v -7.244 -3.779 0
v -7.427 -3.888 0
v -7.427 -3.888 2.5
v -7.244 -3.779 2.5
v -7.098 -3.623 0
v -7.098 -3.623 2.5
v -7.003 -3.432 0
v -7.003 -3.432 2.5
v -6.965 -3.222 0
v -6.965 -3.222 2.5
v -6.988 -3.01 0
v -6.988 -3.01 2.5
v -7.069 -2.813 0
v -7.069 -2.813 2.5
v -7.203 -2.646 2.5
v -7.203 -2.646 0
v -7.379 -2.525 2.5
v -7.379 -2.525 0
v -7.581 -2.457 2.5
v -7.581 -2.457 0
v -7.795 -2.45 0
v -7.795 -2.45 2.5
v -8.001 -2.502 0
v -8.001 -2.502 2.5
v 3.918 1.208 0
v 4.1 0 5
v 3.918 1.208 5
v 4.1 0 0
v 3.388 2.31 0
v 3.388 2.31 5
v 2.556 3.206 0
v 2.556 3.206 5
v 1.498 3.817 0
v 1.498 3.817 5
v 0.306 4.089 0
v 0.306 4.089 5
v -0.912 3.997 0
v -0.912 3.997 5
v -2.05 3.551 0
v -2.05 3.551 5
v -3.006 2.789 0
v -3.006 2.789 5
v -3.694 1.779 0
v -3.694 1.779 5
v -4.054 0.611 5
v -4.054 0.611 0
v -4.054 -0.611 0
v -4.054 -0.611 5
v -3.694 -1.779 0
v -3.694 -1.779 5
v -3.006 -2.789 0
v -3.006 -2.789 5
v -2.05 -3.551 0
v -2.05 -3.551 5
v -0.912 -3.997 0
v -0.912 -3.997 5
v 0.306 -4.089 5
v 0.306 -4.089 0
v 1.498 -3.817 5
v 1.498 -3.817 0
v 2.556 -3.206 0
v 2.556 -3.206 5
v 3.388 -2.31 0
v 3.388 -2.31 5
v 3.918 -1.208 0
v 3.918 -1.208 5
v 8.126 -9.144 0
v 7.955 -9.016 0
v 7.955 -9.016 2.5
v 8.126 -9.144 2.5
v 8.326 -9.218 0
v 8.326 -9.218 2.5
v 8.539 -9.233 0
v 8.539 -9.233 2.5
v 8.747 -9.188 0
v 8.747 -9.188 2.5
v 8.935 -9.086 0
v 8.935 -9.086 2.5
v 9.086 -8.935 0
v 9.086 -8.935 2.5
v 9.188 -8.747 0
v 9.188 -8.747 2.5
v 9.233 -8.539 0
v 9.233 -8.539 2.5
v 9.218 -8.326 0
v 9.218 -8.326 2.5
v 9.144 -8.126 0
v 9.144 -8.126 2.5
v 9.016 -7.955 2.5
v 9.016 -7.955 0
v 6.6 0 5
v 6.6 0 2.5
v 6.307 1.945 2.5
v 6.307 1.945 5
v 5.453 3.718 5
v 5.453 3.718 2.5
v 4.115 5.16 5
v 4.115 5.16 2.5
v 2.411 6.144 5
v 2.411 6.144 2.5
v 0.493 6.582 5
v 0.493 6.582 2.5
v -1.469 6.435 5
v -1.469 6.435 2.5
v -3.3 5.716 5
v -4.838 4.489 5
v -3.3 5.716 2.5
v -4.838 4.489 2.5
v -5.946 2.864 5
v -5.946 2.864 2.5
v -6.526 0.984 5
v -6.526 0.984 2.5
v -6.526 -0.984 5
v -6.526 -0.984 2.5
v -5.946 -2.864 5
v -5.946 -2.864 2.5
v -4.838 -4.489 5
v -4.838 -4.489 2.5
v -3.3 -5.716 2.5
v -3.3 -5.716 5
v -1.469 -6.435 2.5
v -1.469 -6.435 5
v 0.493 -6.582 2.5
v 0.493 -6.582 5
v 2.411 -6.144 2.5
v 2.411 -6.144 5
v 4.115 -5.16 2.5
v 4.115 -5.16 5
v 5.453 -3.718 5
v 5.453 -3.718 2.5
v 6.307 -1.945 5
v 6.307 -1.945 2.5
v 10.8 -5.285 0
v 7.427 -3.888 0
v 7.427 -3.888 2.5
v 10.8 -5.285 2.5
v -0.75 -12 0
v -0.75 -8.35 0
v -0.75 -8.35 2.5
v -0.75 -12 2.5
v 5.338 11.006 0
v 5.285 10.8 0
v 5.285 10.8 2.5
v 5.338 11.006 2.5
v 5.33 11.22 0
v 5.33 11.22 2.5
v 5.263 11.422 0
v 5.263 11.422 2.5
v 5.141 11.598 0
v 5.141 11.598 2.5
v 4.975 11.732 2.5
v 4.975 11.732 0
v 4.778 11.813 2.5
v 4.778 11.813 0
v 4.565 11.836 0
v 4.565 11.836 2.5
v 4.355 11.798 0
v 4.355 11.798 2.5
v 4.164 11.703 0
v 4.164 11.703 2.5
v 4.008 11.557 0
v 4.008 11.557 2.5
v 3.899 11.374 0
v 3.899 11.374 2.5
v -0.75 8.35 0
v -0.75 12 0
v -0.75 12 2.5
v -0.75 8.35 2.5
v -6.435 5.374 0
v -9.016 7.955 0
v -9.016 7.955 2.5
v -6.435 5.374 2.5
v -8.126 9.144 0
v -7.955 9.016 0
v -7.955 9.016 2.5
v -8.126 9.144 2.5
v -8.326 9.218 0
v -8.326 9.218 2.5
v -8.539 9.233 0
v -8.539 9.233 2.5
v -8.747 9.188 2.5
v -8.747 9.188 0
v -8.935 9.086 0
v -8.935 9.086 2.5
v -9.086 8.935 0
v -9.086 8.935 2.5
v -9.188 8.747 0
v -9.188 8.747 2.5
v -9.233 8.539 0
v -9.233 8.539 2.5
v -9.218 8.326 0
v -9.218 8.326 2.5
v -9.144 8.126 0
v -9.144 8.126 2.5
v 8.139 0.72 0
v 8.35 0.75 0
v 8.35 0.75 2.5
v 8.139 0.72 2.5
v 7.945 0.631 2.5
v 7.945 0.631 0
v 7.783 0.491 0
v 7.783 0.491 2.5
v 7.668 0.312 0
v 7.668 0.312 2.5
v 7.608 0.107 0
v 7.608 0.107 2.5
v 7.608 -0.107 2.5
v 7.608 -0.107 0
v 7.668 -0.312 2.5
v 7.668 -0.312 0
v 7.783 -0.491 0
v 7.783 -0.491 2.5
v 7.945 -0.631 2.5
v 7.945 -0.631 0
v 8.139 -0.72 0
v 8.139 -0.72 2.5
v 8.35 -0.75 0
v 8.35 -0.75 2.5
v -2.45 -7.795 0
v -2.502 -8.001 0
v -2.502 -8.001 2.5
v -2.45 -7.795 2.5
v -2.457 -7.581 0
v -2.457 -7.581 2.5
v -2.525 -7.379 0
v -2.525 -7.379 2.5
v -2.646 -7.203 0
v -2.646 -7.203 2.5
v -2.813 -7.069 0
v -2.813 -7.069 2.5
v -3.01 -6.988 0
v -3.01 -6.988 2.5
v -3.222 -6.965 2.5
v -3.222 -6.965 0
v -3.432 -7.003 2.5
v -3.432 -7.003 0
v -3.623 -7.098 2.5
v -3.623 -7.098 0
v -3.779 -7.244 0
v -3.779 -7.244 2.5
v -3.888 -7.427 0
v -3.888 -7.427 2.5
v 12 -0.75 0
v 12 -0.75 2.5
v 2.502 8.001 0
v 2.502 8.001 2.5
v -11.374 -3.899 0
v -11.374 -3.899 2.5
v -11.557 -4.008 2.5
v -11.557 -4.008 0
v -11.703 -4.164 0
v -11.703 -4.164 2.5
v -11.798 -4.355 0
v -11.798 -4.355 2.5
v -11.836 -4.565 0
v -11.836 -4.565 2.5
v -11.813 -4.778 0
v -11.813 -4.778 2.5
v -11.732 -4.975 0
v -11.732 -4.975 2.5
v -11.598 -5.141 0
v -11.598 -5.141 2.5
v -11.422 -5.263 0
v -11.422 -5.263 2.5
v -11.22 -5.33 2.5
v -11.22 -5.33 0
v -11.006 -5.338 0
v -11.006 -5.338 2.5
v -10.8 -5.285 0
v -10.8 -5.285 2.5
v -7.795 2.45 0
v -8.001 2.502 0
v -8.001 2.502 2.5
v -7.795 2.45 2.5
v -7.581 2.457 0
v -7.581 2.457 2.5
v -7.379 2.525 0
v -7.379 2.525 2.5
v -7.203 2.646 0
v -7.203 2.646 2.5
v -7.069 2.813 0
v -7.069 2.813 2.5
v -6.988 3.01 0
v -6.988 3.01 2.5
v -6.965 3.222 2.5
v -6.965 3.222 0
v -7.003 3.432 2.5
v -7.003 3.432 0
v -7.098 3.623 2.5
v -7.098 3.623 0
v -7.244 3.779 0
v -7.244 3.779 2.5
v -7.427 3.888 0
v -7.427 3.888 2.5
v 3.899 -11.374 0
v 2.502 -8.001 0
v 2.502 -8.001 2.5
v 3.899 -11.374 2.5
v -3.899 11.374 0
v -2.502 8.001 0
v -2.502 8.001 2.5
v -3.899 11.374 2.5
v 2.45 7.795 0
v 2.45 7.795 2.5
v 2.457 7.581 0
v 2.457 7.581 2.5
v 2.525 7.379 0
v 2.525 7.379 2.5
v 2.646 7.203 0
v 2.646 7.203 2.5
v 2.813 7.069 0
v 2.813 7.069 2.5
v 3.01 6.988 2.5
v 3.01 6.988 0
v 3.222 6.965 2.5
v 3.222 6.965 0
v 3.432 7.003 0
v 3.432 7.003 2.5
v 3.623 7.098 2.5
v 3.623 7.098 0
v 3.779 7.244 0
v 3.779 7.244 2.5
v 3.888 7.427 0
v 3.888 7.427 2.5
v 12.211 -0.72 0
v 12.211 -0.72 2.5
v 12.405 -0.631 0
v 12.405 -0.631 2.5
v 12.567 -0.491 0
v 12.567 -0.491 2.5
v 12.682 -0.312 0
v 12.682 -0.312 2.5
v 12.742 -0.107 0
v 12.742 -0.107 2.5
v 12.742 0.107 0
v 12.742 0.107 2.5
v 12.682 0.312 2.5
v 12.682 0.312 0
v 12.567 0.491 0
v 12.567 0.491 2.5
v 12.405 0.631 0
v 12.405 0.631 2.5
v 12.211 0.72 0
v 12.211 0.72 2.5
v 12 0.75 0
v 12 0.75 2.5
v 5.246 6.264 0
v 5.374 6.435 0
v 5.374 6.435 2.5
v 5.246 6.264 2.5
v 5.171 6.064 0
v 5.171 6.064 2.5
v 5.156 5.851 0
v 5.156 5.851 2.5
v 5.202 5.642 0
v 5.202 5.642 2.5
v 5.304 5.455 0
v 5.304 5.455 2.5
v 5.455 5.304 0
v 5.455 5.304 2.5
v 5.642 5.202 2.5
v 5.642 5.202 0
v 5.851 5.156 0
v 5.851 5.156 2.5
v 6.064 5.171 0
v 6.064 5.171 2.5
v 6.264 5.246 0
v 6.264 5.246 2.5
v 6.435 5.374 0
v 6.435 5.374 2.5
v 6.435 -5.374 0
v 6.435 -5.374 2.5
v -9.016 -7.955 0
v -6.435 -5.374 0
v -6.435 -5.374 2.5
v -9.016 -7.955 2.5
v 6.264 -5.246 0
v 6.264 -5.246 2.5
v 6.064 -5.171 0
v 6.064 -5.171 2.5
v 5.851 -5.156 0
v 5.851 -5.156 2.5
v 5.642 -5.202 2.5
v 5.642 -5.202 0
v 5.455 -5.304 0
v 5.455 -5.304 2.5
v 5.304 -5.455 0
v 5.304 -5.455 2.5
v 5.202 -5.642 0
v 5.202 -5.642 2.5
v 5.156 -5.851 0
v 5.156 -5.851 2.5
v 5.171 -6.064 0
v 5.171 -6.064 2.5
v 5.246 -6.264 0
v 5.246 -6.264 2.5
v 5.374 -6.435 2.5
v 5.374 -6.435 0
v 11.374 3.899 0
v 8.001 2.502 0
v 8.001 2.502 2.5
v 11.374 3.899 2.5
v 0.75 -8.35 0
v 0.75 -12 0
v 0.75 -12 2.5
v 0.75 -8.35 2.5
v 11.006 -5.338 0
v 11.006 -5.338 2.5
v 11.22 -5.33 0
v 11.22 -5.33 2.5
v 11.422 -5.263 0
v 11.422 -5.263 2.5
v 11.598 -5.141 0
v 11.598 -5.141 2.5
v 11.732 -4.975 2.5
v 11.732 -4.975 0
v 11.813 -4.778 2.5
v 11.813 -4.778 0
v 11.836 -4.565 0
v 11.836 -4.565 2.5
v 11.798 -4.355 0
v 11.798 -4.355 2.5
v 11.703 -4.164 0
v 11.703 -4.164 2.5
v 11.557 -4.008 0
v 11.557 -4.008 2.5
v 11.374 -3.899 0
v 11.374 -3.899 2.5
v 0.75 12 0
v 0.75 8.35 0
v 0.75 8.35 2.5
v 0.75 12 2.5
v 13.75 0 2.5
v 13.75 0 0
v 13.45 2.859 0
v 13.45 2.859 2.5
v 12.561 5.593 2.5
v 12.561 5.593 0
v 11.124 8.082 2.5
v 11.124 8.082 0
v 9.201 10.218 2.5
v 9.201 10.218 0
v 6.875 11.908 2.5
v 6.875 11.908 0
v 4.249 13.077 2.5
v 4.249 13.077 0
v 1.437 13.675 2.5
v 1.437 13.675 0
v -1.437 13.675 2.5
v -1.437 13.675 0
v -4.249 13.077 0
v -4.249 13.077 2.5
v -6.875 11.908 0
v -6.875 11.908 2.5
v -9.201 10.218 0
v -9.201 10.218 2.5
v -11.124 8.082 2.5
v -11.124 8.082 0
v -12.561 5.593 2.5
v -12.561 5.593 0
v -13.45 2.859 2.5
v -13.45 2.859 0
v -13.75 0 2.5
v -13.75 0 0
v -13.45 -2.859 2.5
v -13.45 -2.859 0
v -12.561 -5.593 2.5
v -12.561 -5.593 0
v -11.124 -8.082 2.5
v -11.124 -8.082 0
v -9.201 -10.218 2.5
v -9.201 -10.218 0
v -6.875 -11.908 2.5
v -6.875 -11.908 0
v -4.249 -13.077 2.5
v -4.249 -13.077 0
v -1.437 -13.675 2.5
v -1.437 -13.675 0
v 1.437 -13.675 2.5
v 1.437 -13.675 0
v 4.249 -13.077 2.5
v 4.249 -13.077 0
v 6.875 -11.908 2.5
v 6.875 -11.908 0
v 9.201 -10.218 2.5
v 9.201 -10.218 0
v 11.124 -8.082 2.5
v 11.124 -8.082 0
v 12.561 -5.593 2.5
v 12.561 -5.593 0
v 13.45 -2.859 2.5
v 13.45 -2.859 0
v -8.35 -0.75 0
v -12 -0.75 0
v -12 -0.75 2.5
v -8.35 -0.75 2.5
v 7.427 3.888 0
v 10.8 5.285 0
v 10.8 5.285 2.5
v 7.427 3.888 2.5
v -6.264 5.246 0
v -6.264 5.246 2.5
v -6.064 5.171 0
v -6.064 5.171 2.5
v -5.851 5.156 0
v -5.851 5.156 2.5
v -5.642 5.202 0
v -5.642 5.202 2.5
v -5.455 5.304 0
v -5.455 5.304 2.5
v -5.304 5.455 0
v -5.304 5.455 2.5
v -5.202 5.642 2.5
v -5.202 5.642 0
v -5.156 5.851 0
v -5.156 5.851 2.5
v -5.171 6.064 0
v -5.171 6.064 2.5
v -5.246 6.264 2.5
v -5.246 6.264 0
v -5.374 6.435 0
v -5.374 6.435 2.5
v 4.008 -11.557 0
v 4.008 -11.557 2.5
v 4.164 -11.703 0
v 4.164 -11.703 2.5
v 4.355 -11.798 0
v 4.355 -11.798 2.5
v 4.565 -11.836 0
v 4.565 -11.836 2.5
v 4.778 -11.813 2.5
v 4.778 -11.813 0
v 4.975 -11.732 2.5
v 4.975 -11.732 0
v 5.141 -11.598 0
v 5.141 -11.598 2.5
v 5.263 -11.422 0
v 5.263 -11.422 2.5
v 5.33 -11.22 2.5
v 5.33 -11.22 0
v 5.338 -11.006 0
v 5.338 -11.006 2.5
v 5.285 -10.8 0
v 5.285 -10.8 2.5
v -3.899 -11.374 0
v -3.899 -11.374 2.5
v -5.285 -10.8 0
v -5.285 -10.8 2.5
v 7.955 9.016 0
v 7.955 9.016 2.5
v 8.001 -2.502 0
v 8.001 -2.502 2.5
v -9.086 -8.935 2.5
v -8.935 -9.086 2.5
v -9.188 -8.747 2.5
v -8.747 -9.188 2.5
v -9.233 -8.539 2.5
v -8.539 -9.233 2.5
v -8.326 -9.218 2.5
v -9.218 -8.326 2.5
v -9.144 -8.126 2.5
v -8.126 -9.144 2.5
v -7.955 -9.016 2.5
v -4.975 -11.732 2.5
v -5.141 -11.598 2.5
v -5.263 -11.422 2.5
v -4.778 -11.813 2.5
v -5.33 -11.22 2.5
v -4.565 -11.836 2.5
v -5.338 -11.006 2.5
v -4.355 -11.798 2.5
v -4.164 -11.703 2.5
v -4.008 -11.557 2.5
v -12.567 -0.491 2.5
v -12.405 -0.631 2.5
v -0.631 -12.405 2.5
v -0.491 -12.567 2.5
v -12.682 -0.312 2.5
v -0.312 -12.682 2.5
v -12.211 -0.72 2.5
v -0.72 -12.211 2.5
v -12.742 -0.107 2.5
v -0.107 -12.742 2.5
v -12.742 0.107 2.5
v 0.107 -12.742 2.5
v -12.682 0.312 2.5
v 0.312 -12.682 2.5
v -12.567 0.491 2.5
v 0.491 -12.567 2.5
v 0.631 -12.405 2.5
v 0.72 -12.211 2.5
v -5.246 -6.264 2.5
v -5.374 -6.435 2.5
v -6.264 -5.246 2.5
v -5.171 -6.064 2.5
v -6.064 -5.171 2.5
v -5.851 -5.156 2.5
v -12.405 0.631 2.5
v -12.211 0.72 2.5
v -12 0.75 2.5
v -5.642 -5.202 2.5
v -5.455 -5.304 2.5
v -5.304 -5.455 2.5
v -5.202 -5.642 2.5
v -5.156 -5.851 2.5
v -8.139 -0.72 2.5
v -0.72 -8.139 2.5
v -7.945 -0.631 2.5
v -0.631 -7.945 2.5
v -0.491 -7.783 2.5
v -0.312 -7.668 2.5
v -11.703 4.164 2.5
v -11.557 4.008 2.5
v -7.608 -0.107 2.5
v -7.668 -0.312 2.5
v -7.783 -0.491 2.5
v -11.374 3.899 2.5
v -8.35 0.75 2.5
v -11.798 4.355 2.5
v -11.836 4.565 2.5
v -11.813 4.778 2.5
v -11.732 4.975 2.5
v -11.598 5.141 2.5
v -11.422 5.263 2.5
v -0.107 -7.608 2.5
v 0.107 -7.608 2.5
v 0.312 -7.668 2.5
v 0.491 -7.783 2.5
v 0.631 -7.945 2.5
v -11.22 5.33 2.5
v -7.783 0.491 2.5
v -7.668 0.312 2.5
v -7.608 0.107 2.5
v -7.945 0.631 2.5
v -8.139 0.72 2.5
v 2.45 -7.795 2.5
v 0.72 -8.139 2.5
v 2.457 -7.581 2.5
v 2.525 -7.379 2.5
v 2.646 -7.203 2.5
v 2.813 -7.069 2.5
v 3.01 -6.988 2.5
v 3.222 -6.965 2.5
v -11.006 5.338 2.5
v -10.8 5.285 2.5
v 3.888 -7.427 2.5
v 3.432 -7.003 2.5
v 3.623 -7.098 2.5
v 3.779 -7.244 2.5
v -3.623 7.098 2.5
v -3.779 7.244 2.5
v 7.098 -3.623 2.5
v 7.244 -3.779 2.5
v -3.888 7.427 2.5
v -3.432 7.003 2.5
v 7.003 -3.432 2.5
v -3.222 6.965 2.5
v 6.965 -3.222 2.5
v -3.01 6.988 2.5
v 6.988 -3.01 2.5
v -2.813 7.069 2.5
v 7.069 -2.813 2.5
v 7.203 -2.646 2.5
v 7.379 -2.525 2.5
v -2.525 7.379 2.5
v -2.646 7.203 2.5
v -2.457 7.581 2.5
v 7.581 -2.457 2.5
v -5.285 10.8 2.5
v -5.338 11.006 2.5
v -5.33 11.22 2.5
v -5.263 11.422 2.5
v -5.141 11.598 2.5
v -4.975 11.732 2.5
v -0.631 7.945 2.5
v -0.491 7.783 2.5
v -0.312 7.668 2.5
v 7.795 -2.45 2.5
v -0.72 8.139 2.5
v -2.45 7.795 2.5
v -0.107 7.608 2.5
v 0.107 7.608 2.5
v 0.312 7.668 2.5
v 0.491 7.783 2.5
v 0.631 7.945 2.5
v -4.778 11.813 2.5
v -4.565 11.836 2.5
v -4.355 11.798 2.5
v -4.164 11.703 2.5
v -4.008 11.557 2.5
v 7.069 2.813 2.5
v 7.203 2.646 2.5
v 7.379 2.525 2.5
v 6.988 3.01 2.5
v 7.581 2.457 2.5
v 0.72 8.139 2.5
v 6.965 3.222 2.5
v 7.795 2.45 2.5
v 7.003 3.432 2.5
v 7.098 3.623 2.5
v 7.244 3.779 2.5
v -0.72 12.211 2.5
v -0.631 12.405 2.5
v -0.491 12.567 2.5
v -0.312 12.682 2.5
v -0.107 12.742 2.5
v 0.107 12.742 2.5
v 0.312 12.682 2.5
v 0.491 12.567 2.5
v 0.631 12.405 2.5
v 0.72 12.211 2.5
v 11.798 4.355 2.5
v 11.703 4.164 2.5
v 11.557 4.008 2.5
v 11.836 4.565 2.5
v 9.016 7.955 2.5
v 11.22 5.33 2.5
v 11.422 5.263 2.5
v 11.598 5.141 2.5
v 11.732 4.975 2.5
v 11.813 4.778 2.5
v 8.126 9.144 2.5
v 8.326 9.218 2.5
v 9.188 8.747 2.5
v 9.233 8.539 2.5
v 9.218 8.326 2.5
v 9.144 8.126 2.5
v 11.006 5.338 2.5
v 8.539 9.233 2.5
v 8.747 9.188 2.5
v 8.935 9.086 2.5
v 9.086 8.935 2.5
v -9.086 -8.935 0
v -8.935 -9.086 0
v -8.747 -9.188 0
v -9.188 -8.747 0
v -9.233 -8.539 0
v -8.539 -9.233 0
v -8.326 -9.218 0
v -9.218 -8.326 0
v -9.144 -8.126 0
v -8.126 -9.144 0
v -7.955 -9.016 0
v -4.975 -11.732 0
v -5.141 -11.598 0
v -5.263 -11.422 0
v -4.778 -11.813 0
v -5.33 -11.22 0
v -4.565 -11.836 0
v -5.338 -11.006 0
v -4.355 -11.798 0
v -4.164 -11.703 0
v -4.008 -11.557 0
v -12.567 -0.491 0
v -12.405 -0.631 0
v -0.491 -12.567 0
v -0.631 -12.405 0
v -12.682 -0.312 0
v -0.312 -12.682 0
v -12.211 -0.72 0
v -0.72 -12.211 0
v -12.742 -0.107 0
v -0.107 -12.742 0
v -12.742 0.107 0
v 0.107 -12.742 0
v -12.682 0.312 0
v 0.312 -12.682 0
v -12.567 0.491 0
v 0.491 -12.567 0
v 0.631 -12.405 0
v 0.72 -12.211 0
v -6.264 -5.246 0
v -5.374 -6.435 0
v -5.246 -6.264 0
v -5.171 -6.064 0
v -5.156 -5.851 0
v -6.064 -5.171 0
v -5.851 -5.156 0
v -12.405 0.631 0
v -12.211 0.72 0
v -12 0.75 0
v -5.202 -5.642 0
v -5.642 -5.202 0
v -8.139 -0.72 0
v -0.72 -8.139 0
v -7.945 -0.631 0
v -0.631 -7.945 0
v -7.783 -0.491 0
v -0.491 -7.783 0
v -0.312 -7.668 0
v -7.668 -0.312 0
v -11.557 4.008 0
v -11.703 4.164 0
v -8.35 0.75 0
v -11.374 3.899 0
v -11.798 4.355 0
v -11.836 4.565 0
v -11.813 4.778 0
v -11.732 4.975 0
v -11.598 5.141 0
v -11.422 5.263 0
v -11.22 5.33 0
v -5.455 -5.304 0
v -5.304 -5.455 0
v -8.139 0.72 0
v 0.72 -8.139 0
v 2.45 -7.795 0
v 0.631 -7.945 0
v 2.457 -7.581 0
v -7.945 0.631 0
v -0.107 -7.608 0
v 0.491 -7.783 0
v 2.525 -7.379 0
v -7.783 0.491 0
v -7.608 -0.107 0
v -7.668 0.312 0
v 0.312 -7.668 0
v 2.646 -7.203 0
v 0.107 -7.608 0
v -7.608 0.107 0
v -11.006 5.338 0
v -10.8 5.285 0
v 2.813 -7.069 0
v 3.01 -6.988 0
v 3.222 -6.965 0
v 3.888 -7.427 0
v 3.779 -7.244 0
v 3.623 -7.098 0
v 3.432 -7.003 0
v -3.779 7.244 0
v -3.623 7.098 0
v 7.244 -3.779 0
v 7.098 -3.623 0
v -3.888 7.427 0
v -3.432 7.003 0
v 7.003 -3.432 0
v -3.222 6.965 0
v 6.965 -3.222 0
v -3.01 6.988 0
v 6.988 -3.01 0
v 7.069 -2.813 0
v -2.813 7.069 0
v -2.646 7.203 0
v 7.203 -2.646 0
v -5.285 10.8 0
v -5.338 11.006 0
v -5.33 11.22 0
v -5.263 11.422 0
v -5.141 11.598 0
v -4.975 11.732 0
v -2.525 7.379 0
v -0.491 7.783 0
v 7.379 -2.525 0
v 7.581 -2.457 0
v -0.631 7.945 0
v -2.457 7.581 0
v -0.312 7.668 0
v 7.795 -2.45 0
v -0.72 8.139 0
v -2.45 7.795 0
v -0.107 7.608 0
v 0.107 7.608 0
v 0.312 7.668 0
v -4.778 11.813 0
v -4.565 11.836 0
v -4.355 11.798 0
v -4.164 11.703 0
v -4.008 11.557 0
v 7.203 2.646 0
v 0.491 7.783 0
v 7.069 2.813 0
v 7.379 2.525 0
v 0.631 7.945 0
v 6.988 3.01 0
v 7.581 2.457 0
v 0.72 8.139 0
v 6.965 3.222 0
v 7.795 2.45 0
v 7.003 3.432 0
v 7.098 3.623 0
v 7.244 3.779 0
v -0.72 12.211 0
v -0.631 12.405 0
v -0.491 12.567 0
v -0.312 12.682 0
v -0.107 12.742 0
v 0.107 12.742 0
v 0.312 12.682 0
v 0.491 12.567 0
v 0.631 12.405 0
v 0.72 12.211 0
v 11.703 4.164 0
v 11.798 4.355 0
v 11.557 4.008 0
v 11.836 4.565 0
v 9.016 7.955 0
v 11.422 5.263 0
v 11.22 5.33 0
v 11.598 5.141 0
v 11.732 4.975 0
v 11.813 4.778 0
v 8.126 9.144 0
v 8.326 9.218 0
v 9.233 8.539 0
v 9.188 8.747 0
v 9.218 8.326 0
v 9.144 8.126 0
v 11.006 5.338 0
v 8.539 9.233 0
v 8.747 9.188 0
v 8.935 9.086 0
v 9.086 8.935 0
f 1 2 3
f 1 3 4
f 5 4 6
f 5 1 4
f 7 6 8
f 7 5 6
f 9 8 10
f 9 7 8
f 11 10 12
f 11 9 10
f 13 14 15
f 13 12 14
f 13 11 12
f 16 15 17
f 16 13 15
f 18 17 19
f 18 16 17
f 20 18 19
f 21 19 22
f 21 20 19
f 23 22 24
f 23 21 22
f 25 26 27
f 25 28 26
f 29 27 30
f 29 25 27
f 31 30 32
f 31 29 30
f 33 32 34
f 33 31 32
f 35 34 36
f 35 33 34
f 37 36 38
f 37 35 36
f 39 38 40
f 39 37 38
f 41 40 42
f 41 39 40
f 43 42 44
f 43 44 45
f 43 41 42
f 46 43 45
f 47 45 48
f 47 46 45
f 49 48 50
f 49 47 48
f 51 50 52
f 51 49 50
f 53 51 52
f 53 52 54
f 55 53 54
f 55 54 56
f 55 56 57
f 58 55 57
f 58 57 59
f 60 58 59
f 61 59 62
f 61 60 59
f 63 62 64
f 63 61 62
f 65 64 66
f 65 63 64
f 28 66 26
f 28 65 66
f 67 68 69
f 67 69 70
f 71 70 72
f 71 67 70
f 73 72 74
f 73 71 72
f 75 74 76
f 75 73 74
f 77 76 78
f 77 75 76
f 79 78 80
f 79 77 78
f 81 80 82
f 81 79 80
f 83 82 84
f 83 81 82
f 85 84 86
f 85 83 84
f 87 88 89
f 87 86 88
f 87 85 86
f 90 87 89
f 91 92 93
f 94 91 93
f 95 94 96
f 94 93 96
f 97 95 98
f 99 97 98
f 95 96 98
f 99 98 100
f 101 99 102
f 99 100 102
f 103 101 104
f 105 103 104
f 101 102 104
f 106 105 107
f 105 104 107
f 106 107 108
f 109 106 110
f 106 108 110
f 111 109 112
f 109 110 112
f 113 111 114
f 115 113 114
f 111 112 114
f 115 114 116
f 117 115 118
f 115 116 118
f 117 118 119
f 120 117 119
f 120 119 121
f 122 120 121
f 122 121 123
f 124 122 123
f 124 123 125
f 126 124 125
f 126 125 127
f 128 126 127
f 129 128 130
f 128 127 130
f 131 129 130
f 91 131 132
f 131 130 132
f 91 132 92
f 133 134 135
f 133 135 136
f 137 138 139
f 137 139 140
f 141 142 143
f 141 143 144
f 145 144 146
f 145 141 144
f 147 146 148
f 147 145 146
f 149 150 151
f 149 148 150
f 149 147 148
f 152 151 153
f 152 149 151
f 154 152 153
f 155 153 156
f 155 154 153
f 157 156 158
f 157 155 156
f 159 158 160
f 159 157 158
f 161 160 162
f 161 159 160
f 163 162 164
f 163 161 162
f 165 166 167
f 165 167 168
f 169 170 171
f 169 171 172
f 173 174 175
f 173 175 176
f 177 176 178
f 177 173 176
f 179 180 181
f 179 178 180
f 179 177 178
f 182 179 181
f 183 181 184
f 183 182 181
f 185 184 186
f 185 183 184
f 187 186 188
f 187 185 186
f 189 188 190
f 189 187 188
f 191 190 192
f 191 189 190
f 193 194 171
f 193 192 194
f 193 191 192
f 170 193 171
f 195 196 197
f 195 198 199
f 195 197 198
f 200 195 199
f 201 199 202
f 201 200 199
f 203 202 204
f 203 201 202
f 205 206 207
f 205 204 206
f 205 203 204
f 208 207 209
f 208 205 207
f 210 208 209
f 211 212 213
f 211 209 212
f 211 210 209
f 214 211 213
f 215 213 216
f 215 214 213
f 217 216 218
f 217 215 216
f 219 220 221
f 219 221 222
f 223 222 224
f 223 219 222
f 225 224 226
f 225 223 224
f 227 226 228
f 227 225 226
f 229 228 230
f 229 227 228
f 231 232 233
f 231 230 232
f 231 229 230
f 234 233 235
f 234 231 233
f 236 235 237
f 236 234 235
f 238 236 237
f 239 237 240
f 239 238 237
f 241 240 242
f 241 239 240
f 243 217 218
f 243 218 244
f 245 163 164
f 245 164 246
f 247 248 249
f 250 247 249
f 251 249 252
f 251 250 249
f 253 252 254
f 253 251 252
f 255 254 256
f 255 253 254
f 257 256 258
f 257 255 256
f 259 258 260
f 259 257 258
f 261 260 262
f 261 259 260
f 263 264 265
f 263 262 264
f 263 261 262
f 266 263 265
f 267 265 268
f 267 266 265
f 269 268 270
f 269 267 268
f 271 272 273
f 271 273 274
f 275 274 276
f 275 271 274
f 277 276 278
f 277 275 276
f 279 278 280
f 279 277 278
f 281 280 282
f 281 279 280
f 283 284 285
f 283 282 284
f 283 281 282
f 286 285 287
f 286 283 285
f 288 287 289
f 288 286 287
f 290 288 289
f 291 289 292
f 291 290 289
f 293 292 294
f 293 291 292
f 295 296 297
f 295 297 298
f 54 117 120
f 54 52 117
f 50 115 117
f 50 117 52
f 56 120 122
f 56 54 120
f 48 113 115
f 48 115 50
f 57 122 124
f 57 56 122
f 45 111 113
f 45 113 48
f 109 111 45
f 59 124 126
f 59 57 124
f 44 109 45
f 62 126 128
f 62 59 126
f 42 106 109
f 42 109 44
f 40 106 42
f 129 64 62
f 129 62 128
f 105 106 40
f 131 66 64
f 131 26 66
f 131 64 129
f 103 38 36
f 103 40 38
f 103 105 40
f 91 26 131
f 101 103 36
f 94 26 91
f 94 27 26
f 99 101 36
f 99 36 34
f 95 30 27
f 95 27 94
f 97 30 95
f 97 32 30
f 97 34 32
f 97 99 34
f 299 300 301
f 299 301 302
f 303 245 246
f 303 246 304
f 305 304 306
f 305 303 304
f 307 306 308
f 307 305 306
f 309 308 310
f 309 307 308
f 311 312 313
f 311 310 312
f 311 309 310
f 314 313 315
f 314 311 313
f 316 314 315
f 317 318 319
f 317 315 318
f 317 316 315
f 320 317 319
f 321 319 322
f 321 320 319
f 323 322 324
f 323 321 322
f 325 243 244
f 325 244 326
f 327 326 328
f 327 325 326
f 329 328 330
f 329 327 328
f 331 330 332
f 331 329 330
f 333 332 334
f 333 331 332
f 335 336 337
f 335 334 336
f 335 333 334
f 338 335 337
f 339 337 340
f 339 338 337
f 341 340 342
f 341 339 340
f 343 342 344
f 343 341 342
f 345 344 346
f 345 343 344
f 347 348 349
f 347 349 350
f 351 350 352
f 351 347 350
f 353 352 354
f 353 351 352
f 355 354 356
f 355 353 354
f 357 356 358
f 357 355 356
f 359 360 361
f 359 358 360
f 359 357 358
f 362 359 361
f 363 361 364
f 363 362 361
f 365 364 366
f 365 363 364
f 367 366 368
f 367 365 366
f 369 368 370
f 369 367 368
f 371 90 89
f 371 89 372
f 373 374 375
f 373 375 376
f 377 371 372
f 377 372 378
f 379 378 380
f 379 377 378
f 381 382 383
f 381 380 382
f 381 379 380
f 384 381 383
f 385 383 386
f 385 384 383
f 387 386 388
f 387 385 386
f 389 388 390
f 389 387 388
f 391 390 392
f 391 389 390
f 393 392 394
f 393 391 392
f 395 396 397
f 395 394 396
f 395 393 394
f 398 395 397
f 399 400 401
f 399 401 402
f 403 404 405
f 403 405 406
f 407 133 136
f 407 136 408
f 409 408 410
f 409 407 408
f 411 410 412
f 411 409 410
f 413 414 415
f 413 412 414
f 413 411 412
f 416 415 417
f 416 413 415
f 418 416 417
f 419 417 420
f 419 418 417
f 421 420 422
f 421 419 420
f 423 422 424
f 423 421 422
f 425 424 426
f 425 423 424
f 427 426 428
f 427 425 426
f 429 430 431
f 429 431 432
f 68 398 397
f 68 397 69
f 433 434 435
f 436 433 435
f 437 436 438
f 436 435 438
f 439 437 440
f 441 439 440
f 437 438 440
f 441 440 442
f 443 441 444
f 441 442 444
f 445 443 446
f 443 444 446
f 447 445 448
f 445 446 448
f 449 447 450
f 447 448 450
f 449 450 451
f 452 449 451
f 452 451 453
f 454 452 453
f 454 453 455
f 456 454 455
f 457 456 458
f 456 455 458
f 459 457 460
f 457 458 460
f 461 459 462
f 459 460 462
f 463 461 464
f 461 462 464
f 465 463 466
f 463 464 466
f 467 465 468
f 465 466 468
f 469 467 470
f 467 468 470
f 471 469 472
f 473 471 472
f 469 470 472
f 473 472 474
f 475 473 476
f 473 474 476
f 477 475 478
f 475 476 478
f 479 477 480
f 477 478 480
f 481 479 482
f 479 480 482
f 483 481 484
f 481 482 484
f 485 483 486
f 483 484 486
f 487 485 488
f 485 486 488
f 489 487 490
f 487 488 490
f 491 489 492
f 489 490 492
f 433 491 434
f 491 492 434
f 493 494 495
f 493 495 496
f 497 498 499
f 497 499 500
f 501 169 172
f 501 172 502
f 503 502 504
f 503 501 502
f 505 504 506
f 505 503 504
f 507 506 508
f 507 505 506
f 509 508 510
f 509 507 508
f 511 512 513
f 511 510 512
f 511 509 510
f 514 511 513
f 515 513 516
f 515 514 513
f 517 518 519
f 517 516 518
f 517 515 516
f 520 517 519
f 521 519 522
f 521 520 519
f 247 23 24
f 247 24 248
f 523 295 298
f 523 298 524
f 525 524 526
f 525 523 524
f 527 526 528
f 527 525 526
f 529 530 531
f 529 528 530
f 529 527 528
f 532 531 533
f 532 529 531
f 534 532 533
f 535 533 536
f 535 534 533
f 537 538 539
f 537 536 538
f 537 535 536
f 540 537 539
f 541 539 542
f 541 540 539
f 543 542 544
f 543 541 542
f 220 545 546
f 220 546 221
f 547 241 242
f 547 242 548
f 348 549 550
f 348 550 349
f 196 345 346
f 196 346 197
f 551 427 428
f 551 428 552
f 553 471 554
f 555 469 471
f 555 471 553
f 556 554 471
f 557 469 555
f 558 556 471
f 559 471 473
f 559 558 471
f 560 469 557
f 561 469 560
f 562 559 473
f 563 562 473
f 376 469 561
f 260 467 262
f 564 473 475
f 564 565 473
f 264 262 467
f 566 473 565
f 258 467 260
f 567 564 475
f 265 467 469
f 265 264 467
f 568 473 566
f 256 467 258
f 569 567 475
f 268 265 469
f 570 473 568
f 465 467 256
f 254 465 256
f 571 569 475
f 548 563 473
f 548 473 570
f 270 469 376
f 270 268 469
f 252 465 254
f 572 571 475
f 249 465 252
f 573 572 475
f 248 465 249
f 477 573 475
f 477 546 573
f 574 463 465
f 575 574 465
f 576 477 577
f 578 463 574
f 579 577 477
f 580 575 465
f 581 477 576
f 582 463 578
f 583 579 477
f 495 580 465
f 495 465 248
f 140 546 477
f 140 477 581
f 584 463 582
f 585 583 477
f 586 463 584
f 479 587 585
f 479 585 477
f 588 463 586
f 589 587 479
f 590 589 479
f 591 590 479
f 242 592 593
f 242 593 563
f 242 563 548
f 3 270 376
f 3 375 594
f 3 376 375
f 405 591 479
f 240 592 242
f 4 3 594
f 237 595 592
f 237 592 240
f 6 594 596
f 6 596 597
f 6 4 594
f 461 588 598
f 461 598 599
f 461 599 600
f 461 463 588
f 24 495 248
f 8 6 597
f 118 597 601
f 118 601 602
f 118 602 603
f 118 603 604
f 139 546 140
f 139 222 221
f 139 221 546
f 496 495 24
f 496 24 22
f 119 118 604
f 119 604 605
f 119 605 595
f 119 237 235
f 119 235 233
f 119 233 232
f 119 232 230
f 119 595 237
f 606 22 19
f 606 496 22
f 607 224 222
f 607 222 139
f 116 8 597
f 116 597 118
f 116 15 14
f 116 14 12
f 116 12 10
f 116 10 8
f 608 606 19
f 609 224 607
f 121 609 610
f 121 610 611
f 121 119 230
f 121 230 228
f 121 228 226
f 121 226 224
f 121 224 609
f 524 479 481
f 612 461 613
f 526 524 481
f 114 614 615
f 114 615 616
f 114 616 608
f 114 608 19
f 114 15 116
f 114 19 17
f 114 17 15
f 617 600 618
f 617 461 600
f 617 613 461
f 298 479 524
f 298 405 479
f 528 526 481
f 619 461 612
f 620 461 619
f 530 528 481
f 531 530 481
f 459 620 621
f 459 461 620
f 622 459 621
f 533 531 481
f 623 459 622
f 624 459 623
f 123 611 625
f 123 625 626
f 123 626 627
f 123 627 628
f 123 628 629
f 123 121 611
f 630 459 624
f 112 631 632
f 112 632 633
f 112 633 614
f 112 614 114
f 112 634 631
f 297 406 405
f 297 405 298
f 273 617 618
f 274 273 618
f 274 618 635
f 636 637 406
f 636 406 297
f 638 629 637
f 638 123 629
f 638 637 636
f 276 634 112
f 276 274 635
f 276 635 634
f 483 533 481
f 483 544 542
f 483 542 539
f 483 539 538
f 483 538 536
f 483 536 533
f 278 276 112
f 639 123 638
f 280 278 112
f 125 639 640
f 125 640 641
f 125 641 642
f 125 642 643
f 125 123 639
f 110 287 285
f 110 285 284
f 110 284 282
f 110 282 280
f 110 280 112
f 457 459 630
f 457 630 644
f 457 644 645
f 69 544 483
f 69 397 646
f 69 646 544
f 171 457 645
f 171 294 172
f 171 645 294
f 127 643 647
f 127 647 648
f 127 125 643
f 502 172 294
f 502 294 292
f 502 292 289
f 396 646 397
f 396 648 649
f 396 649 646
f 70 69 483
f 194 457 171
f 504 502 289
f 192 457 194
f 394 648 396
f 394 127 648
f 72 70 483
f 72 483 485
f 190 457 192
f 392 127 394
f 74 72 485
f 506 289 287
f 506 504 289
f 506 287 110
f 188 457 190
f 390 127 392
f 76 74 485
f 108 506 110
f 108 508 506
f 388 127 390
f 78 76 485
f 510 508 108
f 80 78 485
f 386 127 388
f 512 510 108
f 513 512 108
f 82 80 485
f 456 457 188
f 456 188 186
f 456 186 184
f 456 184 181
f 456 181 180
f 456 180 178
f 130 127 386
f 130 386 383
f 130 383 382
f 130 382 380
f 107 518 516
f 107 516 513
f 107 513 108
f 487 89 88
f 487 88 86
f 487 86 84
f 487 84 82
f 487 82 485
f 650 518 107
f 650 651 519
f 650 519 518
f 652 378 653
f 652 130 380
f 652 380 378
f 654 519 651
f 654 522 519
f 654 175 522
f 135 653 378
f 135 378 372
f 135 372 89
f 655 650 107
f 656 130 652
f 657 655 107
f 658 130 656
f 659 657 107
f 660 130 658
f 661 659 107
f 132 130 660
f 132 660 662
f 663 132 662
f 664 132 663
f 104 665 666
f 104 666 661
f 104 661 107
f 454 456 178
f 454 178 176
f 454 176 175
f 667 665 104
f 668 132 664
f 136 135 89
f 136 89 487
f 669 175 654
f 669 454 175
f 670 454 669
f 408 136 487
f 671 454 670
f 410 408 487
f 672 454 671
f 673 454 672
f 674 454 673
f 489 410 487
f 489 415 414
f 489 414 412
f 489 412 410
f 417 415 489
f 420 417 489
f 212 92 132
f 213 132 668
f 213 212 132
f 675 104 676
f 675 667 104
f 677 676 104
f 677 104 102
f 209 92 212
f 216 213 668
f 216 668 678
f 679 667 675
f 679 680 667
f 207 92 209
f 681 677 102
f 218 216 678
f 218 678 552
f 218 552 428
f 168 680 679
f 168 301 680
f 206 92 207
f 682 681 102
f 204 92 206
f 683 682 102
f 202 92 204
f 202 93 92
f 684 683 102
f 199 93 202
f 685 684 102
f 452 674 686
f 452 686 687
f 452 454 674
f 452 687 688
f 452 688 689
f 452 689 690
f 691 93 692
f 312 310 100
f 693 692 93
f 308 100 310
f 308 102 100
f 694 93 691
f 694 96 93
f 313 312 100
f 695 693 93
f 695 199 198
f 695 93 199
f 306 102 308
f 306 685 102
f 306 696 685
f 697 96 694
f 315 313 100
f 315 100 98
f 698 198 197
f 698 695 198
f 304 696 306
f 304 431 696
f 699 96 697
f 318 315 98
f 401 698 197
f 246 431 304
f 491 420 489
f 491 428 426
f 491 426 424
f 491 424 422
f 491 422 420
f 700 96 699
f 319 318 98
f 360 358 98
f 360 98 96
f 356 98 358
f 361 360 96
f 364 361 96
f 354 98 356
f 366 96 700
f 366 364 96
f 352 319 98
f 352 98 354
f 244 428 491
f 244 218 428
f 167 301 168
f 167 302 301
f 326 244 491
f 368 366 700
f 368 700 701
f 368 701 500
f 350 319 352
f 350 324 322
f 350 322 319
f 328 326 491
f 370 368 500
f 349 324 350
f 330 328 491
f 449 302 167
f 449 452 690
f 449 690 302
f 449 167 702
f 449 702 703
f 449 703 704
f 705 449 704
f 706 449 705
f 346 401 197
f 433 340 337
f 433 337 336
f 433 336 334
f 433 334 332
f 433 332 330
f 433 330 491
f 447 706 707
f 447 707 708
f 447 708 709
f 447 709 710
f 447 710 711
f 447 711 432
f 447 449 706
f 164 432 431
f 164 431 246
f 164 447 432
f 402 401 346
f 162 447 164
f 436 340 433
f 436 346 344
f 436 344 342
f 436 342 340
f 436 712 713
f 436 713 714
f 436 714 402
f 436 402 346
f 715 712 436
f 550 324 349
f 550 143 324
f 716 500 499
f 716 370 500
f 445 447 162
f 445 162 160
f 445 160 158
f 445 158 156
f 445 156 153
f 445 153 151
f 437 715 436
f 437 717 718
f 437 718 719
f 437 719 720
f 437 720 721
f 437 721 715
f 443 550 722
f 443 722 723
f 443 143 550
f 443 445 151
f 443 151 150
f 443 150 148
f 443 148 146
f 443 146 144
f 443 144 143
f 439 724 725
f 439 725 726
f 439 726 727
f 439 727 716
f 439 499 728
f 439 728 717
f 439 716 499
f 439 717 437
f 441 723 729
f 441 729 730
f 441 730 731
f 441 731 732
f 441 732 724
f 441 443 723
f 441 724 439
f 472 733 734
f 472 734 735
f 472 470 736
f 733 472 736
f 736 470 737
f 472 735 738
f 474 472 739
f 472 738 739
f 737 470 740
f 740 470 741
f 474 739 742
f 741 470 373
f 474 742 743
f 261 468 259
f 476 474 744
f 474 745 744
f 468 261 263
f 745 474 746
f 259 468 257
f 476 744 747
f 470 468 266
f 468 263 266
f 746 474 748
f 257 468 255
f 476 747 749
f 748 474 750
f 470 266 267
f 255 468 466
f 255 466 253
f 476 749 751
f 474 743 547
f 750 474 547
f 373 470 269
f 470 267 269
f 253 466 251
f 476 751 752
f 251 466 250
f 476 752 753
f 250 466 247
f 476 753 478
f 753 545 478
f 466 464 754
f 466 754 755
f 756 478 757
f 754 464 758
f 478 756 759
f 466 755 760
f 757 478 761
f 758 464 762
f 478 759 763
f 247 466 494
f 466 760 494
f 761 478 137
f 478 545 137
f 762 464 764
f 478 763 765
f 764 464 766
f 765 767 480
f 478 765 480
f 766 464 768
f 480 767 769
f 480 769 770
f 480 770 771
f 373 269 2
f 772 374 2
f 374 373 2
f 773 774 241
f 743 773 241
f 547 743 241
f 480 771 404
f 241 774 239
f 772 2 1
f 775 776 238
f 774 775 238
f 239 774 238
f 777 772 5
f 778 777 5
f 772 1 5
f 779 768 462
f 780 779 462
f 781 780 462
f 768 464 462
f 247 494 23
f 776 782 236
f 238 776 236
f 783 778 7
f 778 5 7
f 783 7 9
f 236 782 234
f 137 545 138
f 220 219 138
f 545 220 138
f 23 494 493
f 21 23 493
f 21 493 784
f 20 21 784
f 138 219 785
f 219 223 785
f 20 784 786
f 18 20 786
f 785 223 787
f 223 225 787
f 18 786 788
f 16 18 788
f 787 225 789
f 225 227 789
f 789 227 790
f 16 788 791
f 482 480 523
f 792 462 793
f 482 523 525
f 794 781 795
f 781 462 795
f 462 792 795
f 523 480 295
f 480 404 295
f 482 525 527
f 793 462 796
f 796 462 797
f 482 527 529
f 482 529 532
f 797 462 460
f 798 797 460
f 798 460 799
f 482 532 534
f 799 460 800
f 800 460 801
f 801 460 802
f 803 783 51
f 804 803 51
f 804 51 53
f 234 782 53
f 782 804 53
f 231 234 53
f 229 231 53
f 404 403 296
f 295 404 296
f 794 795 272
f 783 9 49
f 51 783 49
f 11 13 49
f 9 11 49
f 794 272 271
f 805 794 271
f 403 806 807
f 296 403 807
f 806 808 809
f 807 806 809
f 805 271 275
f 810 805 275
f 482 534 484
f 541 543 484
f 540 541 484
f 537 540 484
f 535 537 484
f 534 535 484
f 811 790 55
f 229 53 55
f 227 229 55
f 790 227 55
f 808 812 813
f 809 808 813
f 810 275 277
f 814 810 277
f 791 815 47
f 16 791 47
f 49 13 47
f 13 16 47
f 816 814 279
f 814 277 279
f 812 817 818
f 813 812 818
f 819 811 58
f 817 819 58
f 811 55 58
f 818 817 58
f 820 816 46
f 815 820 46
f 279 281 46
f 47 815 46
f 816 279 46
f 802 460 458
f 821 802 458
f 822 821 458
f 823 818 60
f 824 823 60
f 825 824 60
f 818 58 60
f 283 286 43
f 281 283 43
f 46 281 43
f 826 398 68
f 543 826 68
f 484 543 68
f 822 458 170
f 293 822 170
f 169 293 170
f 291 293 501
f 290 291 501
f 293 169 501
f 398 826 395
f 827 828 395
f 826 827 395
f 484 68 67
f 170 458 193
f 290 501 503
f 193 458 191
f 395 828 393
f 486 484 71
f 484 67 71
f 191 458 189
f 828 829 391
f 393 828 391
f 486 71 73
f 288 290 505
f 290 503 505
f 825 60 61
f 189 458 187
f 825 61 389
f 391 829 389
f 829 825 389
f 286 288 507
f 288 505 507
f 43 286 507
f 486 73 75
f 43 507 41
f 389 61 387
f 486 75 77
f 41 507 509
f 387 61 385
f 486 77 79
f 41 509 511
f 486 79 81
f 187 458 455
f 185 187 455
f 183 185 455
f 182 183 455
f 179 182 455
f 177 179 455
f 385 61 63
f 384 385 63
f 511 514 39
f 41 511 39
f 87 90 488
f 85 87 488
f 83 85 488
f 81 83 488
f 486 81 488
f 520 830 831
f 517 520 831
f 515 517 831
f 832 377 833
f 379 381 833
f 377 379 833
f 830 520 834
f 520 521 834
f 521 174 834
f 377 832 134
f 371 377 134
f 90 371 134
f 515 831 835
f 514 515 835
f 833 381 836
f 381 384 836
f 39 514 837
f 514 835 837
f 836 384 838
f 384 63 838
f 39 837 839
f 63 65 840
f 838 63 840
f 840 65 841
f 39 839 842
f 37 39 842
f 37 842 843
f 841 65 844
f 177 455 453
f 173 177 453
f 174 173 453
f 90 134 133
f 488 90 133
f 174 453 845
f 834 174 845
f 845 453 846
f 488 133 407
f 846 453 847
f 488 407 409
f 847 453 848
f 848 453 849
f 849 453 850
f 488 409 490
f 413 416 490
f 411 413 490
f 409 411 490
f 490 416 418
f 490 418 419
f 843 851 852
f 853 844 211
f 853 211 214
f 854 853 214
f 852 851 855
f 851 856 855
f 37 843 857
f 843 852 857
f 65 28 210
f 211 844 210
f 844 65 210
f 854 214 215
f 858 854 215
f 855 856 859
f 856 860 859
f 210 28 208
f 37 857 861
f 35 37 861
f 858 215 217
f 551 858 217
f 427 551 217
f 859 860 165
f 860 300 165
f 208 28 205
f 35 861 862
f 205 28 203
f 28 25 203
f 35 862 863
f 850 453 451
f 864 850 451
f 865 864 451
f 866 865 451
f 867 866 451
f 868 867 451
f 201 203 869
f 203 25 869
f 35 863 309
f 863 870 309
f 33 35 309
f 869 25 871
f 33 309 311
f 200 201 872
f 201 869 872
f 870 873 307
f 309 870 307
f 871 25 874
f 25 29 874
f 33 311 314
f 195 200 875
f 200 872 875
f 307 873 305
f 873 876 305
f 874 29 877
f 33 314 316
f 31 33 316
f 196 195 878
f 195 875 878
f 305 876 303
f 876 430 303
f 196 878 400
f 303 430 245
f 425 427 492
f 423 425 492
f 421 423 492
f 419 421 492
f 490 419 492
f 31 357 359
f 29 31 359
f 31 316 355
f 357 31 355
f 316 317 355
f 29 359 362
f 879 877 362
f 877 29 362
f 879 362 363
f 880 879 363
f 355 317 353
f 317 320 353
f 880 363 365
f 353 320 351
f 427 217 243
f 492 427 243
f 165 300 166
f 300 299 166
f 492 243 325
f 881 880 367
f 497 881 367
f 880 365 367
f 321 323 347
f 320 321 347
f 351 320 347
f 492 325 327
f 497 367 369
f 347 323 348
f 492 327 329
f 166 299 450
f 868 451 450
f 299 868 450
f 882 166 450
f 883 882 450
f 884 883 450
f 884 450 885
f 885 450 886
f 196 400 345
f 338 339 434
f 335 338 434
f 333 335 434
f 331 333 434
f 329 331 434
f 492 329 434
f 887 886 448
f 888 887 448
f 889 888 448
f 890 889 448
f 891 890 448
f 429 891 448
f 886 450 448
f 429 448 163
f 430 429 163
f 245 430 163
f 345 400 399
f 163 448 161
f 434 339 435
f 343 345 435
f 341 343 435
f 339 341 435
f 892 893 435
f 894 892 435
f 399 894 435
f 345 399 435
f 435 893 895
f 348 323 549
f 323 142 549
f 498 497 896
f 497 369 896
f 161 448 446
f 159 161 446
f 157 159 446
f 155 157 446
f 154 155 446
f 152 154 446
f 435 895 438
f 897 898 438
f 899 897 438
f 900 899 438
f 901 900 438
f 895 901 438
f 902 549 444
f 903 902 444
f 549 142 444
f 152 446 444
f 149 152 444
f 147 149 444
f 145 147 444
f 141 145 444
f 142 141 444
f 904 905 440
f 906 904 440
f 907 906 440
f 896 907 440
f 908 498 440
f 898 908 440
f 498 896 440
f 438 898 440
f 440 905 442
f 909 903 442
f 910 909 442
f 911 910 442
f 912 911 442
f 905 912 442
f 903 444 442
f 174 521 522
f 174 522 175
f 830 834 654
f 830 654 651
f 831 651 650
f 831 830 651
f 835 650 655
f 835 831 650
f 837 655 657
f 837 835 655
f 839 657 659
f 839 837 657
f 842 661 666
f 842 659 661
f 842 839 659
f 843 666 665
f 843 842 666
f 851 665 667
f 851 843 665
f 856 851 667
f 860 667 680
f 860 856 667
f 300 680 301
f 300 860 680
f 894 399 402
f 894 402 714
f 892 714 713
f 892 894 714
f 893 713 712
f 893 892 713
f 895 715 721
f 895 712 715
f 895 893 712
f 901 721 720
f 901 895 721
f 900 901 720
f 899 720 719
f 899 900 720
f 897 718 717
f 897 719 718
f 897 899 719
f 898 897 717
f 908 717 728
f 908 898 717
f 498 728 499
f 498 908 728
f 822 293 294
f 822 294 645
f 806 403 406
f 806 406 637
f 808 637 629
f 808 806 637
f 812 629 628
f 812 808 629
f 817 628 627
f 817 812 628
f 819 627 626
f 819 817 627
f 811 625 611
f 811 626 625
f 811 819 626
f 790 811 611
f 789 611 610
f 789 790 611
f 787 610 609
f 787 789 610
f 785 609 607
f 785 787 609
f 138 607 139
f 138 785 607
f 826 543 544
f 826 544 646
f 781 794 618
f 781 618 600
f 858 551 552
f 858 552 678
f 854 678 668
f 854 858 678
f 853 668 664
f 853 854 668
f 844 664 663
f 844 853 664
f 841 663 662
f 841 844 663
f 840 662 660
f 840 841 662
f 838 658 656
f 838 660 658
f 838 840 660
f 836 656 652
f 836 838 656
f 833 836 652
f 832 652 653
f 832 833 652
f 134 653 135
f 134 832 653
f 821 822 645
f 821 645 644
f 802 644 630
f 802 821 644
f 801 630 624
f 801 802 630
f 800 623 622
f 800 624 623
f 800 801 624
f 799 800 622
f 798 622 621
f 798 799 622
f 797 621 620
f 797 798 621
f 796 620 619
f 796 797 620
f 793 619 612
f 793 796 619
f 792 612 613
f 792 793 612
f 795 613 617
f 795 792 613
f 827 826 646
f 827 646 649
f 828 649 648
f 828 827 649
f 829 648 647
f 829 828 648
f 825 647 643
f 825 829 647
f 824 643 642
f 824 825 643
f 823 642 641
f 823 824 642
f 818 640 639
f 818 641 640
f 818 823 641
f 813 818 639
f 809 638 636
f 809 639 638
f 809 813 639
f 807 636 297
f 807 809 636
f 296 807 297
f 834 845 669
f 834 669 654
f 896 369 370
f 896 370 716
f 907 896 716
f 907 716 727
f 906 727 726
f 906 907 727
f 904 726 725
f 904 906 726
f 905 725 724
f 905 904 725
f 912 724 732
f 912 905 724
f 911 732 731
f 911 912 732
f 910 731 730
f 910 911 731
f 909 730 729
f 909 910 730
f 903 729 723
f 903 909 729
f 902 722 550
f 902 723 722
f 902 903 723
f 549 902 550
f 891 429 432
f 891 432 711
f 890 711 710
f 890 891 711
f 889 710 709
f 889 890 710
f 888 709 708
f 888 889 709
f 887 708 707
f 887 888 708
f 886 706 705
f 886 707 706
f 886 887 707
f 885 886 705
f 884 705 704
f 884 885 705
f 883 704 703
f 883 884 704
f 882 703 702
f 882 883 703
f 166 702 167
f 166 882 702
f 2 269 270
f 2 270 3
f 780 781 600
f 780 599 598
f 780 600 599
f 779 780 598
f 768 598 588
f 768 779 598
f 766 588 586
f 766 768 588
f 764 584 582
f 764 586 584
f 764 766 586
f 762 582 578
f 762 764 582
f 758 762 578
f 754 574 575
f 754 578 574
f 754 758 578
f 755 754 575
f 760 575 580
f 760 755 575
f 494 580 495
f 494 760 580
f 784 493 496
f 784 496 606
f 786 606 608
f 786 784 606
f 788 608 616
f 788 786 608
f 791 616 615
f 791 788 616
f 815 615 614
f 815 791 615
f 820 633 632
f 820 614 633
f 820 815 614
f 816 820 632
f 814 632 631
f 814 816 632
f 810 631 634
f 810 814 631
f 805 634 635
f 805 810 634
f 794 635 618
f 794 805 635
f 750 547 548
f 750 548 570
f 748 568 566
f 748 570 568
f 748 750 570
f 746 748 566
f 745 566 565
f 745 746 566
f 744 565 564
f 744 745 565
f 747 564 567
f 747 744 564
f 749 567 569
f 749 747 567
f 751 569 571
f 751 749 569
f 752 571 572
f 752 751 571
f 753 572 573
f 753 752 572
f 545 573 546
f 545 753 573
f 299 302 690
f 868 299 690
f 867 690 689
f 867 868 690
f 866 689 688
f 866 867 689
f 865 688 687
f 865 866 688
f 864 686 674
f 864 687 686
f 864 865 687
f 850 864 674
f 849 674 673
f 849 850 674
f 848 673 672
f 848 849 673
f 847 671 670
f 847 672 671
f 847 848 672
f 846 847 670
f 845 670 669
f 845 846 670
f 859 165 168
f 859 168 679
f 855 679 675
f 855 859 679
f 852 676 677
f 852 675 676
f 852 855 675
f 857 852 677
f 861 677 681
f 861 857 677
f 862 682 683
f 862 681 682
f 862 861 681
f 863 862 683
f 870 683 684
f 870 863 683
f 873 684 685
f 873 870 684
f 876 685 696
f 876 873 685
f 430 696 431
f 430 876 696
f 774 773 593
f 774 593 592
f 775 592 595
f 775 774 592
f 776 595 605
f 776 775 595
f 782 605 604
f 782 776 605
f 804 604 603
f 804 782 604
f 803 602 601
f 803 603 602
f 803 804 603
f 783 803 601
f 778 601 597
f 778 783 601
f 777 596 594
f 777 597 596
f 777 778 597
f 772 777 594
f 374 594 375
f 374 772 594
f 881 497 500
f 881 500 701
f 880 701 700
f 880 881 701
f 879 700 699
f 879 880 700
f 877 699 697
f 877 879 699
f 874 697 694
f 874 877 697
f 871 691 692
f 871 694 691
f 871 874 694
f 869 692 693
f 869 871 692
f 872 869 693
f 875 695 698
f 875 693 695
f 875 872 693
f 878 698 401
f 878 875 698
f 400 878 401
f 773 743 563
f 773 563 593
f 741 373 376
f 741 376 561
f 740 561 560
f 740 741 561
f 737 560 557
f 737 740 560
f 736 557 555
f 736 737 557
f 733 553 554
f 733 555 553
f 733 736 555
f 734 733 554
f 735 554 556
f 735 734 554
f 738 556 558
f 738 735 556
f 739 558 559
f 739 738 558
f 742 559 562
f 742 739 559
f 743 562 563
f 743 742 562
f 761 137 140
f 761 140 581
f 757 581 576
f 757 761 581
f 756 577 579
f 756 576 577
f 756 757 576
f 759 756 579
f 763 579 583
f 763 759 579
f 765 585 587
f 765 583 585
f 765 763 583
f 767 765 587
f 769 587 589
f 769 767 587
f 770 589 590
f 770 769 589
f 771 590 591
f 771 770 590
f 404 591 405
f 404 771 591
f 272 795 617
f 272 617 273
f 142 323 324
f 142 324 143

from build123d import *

# Parameters (mm, degrees)
SKETCH1_R               = 13.75
SKETCH1_R_2             = 4.1
BOSS_EXTRUDE1_DEPTH     = 2.5
SKETCH2_R               = 6.6
SKETCH2_R_2             = 4.1
BOSS_EXTRUDE2_DEPTH     = 2.5
CUT_EXTRUDE1_DEPTH      = 20.605483927
CUT_EXTRUDE1_DEPTH_BACK = 20.605483927
SKETCH3_R               = 0.75


with BuildPart() as part:
    # Sketch1 → Boss-Extrude1 (new body)
    with BuildSketch(Plane.XY):
        Circle(SKETCH1_R)
        Circle(SKETCH1_R_2, mode=Mode.SUBTRACT)
    extrude(amount=BOSS_EXTRUDE1_DEPTH)

    # Sketch2 → Boss-Extrude2 (add)
    with BuildSketch(Plane.XY.offset(2.5)):
        Circle(SKETCH2_R)
        Circle(SKETCH2_R_2, mode=Mode.SUBTRACT)
    extrude(amount=BOSS_EXTRUDE2_DEPTH)

    # Sketch3 → Cut-Extrude1 (cut, two sides: drawn at the far end of the back side and taken through both)
    with BuildSketch(Plane.XY.offset(2.5).offset(-CUT_EXTRUDE1_DEPTH_BACK)):
        with BuildLine():
            ThreePointArc((0.75, 12), (0, 11.25), (-0.75, 12))
            Line((-0.75, 12), (-0.75, 8.35))
            ThreePointArc((-0.75, 8.35), (0, 9.1), (0.75, 8.35))
            Line((0.75, 8.35), (0.75, 12))
        make_face()
        with BuildLine():
            ThreePointArc((5.285110838, 10.799541816), (4.305188614, 10.393644741), (3.899291539, 11.373566964))
            Line((3.899291539, 11.373566964), (2.502497011, 8.001406671))
            ThreePointArc((2.502497011, 8.001406671), (3.341724402, 8.449983057), (3.94540666, 7.714394096))
            ThreePointArc((3.94540666, 7.714394096), (3.930995621, 7.568076355), (3.88831631, 7.427381522))
            Line((3.88831631, 7.427381522), (5.285110838, 10.799541816))
        make_face()
        with BuildLine():
            ThreePointArc((9.01561146, 7.954951288), (7.954951288, 7.954951288), (7.954951288, 9.01561146))
            Line((7.954951288, 9.01561146), (5.374011537, 6.434671709))
            ThreePointArc((5.374011537, 6.434671709), (6.191354197, 6.597251272), (6.654341623, 5.904341623))
            ThreePointArc((6.654341623, 5.904341623), (6.597251272, 5.617329049), (6.434671709, 5.374011537))
            Line((6.434671709, 5.374011537), (9.01561146, 7.954951288))
        make_face()
        with BuildLine():
            ThreePointArc((11.373566964, 3.899291539), (10.393644741, 4.305188614), (10.799541816, 5.285110838))
            Line((10.799541816, 5.285110838), (7.427381522, 3.88831631))
            ThreePointArc((7.427381522, 3.88831631), (8.131071771, 3.819008869), (8.464394096, 3.19540666))
            ThreePointArc((8.464394096, 3.19540666), (8.337996306, 2.778728985), (8.001406671, 2.502497011))
            Line((8.001406671, 2.502497011), (11.373566964, 3.899291539))
        make_face()
        with BuildLine():
            ThreePointArc((12, -0.75), (11.25, 0), (12, 0.75))
            Line((12, 0.75), (8.35, 0.75))
            ThreePointArc((8.35, 0.75), (8.880330086, 0.530330086), (9.1, 0))
            ThreePointArc((9.1, 0), (8.880330086, -0.530330086), (8.35, -0.75))
            Line((8.35, -0.75), (12, -0.75))
        make_face()
        with BuildLine():
            ThreePointArc((10.799541816, -5.285110838), (10.393644741, -4.305188614), (11.373566964, -3.899291539))
            Line((11.373566964, -3.899291539), (8.001406671, -2.502497011))
            ThreePointArc((8.001406671, -2.502497011), (8.337996306, -2.778728985), (8.464394096, -3.19540666))
            ThreePointArc((8.464394096, -3.19540666), (8.131071771, -3.819008869), (7.427381522, -3.88831631))
            Line((7.427381522, -3.88831631), (10.799541816, -5.285110838))
        make_face()
        with BuildLine():
            ThreePointArc((7.954951288, -9.01561146), (7.954951288, -7.954951288), (9.01561146, -7.954951288))
            Line((9.01561146, -7.954951288), (6.434671709, -5.374011537))
            ThreePointArc((6.434671709, -5.374011537), (6.597251272, -5.617329049), (6.654341623, -5.904341623))
            ThreePointArc((6.654341623, -5.904341623), (6.191354197, -6.597251272), (5.374011537, -6.434671709))
            Line((5.374011537, -6.434671709), (7.954951288, -9.01561146))
        make_face()
        with BuildLine():
            ThreePointArc((3.899291539, -11.373566964), (4.305188614, -10.393644741), (5.285110838, -10.799541816))
            Line((5.285110838, -10.799541816), (3.88831631, -7.427381522))
            ThreePointArc((3.88831631, -7.427381522), (3.930995621, -7.568076355), (3.94540666, -7.714394096))
            ThreePointArc((3.94540666, -7.714394096), (3.341724402, -8.449983057), (2.502497011, -8.001406671))
            Line((2.502497011, -8.001406671), (3.899291539, -11.373566964))
        make_face()
        with BuildLine():
            ThreePointArc((-0.75, -12), (0, -11.25), (0.75, -12))
            Line((0.75, -12), (0.75, -8.35))
            ThreePointArc((0.75, -8.35), (0, -9.1), (-0.75, -8.35))
            Line((-0.75, -8.35), (-0.75, -12))
        make_face()
        with BuildLine():
            ThreePointArc((-3.842201188, -11.08655439), (-3.856612228, -11.232872132), (-3.899291539, -11.373566964))
            Line((-3.899291539, -11.373566964), (-2.502497011, -8.001406671))
            ThreePointArc((-2.502497011, -8.001406671), (-3.482419235, -8.407303746), (-3.88831631, -7.427381522))
            Line((-3.88831631, -7.427381522), (-5.285110838, -10.799541816))
            ThreePointArc((-5.285110838, -10.799541816), (-4.445883447, -10.35096543), (-3.842201188, -11.08655439))
        make_face()
        with BuildLine():
            ThreePointArc((-7.735281374, -8.485281374), (-7.792371725, -8.772293949), (-7.954951288, -9.01561146))
            Line((-7.954951288, -9.01561146), (-5.374011537, -6.434671709))
            ThreePointArc((-5.374011537, -6.434671709), (-6.434671709, -6.434671709), (-6.434671709, -5.374011537))
            Line((-6.434671709, -5.374011537), (-9.01561146, -7.954951288))
            ThreePointArc((-9.01561146, -7.954951288), (-8.1982688, -7.792371725), (-7.735281374, -8.485281374))
        make_face()
        with BuildLine():
            ThreePointArc((-10.33655439, -4.592201188), (-10.462952181, -5.008878863), (-10.799541816, -5.285110838))
            Line((-10.799541816, -5.285110838), (-7.427381522, -3.88831631))
            ThreePointArc((-7.427381522, -3.88831631), (-8.407303746, -3.482419235), (-8.001406671, -2.502497011))
            Line((-8.001406671, -2.502497011), (-11.373566964, -3.899291539))
            ThreePointArc((-11.373566964, -3.899291539), (-10.669876715, -3.968598979), (-10.33655439, -4.592201188))
        make_face()
        with BuildLine():
            ThreePointArc((-11.25, 0), (-11.469669914, -0.530330086), (-12, -0.75))
            Line((-12, -0.75), (-8.35, -0.75))
            ThreePointArc((-8.35, -0.75), (-9.1, 0), (-8.35, 0.75))
            Line((-8.35, 0.75), (-12, 0.75))
            ThreePointArc((-12, 0.75), (-11.469669914, 0.530330086), (-11.25, 0))
        make_face()
        with BuildLine():
            ThreePointArc((-10.33655439, 4.592201188), (-10.669876715, 3.968598979), (-11.373566964, 3.899291539))
            Line((-11.373566964, 3.899291539), (-8.001406671, 2.502497011))
            ThreePointArc((-8.001406671, 2.502497011), (-8.407303746, 3.482419235), (-7.427381522, 3.88831631))
            Line((-7.427381522, 3.88831631), (-10.799541816, 5.285110838))
            ThreePointArc((-10.799541816, 5.285110838), (-10.462952181, 5.008878863), (-10.33655439, 4.592201188))
        make_face()
        with BuildLine():
            ThreePointArc((-7.735281374, 8.485281374), (-8.1982688, 7.792371725), (-9.01561146, 7.954951288))
            Line((-9.01561146, 7.954951288), (-6.434671709, 5.374011537))
            ThreePointArc((-6.434671709, 5.374011537), (-6.434671709, 6.434671709), (-5.374011537, 6.434671709))
            Line((-5.374011537, 6.434671709), (-7.954951288, 9.01561146))
            ThreePointArc((-7.954951288, 9.01561146), (-7.792371725, 8.772293949), (-7.735281374, 8.485281374))
        make_face()
        with BuildLine():
            ThreePointArc((-3.842201188, 11.08655439), (-4.445883447, 10.35096543), (-5.285110838, 10.799541816))
            Line((-5.285110838, 10.799541816), (-3.88831631, 7.427381522))
            ThreePointArc((-3.88831631, 7.427381522), (-3.482419235, 8.407303746), (-2.502497011, 8.001406671))
            Line((-2.502497011, 8.001406671), (-3.899291539, 11.373566964))
            ThreePointArc((-3.899291539, 11.373566964), (-3.856612228, 11.232872132), (-3.842201188, 11.08655439))
        make_face()
        with Locations((0, 12)):
            Circle(SKETCH3_R)
        with Locations((4.592201188, 11.08655439)):
            Circle(SKETCH3_R)
        with Locations((8.485281374, 8.485281374)):
            Circle(SKETCH3_R)
        with Locations((11.08655439, 4.592201188)):
            Circle(SKETCH3_R)
        with Locations((7.714394096, 3.19540666)):
            Circle(SKETCH3_R)
        with Locations((5.904341623, 5.904341623)):
            Circle(SKETCH3_R)
        with Locations((3.19540666, 7.714394096)):
            Circle(SKETCH3_R)
        with Locations((0, 8.35)):
            Circle(SKETCH3_R)
        with Locations((-4.592201188, 11.08655439)):
            Circle(SKETCH3_R)
        with Locations((-8.485281374, 8.485281374)):
            Circle(SKETCH3_R)
        with Locations((-11.08655439, 4.592201188)):
            Circle(SKETCH3_R)
        with Locations((-7.714394096, 3.19540666)):
            Circle(SKETCH3_R)
        with Locations((-5.904341623, 5.904341623)):
            Circle(SKETCH3_R)
        with Locations((-3.19540666, 7.714394096)):
            Circle(SKETCH3_R)
        with Locations((-12, 0)):
            Circle(SKETCH3_R)
        with Locations((-11.08655439, -4.592201188)):
            Circle(SKETCH3_R)
        with Locations((-8.485281374, -8.485281374)):
            Circle(SKETCH3_R)
        with Locations((-4.592201188, -11.08655439)):
            Circle(SKETCH3_R)
        with Locations((-8.35, 0)):
            Circle(SKETCH3_R)
        with Locations((-7.714394096, -3.19540666)):
            Circle(SKETCH3_R)
        with Locations((-5.904341623, -5.904341623)):
            Circle(SKETCH3_R)
        with Locations((-3.19540666, -7.714394096)):
            Circle(SKETCH3_R)
        with Locations((3.19540666, -7.714394096)):
            Circle(SKETCH3_R)
        with Locations((5.904341623, -5.904341623)):
            Circle(SKETCH3_R)
        with Locations((7.714394096, -3.19540666)):
            Circle(SKETCH3_R)
        with Locations((8.35, 0)):
            Circle(SKETCH3_R)
        with Locations((12, 0)):
            Circle(SKETCH3_R)
        with Locations((11.08655439, -4.592201188)):
            Circle(SKETCH3_R)
        with Locations((8.485281374, -8.485281374)):
            Circle(SKETCH3_R)
        with Locations((4.592201188, -11.08655439)):
            Circle(SKETCH3_R)
        with Locations((0, -12)):
            Circle(SKETCH3_R)
        with Locations((0, -8.35)):
            Circle(SKETCH3_R)
    extrude(amount=CUT_EXTRUDE1_DEPTH + CUT_EXTRUDE1_DEPTH_BACK, mode=Mode.SUBTRACT)


solid = part.part
